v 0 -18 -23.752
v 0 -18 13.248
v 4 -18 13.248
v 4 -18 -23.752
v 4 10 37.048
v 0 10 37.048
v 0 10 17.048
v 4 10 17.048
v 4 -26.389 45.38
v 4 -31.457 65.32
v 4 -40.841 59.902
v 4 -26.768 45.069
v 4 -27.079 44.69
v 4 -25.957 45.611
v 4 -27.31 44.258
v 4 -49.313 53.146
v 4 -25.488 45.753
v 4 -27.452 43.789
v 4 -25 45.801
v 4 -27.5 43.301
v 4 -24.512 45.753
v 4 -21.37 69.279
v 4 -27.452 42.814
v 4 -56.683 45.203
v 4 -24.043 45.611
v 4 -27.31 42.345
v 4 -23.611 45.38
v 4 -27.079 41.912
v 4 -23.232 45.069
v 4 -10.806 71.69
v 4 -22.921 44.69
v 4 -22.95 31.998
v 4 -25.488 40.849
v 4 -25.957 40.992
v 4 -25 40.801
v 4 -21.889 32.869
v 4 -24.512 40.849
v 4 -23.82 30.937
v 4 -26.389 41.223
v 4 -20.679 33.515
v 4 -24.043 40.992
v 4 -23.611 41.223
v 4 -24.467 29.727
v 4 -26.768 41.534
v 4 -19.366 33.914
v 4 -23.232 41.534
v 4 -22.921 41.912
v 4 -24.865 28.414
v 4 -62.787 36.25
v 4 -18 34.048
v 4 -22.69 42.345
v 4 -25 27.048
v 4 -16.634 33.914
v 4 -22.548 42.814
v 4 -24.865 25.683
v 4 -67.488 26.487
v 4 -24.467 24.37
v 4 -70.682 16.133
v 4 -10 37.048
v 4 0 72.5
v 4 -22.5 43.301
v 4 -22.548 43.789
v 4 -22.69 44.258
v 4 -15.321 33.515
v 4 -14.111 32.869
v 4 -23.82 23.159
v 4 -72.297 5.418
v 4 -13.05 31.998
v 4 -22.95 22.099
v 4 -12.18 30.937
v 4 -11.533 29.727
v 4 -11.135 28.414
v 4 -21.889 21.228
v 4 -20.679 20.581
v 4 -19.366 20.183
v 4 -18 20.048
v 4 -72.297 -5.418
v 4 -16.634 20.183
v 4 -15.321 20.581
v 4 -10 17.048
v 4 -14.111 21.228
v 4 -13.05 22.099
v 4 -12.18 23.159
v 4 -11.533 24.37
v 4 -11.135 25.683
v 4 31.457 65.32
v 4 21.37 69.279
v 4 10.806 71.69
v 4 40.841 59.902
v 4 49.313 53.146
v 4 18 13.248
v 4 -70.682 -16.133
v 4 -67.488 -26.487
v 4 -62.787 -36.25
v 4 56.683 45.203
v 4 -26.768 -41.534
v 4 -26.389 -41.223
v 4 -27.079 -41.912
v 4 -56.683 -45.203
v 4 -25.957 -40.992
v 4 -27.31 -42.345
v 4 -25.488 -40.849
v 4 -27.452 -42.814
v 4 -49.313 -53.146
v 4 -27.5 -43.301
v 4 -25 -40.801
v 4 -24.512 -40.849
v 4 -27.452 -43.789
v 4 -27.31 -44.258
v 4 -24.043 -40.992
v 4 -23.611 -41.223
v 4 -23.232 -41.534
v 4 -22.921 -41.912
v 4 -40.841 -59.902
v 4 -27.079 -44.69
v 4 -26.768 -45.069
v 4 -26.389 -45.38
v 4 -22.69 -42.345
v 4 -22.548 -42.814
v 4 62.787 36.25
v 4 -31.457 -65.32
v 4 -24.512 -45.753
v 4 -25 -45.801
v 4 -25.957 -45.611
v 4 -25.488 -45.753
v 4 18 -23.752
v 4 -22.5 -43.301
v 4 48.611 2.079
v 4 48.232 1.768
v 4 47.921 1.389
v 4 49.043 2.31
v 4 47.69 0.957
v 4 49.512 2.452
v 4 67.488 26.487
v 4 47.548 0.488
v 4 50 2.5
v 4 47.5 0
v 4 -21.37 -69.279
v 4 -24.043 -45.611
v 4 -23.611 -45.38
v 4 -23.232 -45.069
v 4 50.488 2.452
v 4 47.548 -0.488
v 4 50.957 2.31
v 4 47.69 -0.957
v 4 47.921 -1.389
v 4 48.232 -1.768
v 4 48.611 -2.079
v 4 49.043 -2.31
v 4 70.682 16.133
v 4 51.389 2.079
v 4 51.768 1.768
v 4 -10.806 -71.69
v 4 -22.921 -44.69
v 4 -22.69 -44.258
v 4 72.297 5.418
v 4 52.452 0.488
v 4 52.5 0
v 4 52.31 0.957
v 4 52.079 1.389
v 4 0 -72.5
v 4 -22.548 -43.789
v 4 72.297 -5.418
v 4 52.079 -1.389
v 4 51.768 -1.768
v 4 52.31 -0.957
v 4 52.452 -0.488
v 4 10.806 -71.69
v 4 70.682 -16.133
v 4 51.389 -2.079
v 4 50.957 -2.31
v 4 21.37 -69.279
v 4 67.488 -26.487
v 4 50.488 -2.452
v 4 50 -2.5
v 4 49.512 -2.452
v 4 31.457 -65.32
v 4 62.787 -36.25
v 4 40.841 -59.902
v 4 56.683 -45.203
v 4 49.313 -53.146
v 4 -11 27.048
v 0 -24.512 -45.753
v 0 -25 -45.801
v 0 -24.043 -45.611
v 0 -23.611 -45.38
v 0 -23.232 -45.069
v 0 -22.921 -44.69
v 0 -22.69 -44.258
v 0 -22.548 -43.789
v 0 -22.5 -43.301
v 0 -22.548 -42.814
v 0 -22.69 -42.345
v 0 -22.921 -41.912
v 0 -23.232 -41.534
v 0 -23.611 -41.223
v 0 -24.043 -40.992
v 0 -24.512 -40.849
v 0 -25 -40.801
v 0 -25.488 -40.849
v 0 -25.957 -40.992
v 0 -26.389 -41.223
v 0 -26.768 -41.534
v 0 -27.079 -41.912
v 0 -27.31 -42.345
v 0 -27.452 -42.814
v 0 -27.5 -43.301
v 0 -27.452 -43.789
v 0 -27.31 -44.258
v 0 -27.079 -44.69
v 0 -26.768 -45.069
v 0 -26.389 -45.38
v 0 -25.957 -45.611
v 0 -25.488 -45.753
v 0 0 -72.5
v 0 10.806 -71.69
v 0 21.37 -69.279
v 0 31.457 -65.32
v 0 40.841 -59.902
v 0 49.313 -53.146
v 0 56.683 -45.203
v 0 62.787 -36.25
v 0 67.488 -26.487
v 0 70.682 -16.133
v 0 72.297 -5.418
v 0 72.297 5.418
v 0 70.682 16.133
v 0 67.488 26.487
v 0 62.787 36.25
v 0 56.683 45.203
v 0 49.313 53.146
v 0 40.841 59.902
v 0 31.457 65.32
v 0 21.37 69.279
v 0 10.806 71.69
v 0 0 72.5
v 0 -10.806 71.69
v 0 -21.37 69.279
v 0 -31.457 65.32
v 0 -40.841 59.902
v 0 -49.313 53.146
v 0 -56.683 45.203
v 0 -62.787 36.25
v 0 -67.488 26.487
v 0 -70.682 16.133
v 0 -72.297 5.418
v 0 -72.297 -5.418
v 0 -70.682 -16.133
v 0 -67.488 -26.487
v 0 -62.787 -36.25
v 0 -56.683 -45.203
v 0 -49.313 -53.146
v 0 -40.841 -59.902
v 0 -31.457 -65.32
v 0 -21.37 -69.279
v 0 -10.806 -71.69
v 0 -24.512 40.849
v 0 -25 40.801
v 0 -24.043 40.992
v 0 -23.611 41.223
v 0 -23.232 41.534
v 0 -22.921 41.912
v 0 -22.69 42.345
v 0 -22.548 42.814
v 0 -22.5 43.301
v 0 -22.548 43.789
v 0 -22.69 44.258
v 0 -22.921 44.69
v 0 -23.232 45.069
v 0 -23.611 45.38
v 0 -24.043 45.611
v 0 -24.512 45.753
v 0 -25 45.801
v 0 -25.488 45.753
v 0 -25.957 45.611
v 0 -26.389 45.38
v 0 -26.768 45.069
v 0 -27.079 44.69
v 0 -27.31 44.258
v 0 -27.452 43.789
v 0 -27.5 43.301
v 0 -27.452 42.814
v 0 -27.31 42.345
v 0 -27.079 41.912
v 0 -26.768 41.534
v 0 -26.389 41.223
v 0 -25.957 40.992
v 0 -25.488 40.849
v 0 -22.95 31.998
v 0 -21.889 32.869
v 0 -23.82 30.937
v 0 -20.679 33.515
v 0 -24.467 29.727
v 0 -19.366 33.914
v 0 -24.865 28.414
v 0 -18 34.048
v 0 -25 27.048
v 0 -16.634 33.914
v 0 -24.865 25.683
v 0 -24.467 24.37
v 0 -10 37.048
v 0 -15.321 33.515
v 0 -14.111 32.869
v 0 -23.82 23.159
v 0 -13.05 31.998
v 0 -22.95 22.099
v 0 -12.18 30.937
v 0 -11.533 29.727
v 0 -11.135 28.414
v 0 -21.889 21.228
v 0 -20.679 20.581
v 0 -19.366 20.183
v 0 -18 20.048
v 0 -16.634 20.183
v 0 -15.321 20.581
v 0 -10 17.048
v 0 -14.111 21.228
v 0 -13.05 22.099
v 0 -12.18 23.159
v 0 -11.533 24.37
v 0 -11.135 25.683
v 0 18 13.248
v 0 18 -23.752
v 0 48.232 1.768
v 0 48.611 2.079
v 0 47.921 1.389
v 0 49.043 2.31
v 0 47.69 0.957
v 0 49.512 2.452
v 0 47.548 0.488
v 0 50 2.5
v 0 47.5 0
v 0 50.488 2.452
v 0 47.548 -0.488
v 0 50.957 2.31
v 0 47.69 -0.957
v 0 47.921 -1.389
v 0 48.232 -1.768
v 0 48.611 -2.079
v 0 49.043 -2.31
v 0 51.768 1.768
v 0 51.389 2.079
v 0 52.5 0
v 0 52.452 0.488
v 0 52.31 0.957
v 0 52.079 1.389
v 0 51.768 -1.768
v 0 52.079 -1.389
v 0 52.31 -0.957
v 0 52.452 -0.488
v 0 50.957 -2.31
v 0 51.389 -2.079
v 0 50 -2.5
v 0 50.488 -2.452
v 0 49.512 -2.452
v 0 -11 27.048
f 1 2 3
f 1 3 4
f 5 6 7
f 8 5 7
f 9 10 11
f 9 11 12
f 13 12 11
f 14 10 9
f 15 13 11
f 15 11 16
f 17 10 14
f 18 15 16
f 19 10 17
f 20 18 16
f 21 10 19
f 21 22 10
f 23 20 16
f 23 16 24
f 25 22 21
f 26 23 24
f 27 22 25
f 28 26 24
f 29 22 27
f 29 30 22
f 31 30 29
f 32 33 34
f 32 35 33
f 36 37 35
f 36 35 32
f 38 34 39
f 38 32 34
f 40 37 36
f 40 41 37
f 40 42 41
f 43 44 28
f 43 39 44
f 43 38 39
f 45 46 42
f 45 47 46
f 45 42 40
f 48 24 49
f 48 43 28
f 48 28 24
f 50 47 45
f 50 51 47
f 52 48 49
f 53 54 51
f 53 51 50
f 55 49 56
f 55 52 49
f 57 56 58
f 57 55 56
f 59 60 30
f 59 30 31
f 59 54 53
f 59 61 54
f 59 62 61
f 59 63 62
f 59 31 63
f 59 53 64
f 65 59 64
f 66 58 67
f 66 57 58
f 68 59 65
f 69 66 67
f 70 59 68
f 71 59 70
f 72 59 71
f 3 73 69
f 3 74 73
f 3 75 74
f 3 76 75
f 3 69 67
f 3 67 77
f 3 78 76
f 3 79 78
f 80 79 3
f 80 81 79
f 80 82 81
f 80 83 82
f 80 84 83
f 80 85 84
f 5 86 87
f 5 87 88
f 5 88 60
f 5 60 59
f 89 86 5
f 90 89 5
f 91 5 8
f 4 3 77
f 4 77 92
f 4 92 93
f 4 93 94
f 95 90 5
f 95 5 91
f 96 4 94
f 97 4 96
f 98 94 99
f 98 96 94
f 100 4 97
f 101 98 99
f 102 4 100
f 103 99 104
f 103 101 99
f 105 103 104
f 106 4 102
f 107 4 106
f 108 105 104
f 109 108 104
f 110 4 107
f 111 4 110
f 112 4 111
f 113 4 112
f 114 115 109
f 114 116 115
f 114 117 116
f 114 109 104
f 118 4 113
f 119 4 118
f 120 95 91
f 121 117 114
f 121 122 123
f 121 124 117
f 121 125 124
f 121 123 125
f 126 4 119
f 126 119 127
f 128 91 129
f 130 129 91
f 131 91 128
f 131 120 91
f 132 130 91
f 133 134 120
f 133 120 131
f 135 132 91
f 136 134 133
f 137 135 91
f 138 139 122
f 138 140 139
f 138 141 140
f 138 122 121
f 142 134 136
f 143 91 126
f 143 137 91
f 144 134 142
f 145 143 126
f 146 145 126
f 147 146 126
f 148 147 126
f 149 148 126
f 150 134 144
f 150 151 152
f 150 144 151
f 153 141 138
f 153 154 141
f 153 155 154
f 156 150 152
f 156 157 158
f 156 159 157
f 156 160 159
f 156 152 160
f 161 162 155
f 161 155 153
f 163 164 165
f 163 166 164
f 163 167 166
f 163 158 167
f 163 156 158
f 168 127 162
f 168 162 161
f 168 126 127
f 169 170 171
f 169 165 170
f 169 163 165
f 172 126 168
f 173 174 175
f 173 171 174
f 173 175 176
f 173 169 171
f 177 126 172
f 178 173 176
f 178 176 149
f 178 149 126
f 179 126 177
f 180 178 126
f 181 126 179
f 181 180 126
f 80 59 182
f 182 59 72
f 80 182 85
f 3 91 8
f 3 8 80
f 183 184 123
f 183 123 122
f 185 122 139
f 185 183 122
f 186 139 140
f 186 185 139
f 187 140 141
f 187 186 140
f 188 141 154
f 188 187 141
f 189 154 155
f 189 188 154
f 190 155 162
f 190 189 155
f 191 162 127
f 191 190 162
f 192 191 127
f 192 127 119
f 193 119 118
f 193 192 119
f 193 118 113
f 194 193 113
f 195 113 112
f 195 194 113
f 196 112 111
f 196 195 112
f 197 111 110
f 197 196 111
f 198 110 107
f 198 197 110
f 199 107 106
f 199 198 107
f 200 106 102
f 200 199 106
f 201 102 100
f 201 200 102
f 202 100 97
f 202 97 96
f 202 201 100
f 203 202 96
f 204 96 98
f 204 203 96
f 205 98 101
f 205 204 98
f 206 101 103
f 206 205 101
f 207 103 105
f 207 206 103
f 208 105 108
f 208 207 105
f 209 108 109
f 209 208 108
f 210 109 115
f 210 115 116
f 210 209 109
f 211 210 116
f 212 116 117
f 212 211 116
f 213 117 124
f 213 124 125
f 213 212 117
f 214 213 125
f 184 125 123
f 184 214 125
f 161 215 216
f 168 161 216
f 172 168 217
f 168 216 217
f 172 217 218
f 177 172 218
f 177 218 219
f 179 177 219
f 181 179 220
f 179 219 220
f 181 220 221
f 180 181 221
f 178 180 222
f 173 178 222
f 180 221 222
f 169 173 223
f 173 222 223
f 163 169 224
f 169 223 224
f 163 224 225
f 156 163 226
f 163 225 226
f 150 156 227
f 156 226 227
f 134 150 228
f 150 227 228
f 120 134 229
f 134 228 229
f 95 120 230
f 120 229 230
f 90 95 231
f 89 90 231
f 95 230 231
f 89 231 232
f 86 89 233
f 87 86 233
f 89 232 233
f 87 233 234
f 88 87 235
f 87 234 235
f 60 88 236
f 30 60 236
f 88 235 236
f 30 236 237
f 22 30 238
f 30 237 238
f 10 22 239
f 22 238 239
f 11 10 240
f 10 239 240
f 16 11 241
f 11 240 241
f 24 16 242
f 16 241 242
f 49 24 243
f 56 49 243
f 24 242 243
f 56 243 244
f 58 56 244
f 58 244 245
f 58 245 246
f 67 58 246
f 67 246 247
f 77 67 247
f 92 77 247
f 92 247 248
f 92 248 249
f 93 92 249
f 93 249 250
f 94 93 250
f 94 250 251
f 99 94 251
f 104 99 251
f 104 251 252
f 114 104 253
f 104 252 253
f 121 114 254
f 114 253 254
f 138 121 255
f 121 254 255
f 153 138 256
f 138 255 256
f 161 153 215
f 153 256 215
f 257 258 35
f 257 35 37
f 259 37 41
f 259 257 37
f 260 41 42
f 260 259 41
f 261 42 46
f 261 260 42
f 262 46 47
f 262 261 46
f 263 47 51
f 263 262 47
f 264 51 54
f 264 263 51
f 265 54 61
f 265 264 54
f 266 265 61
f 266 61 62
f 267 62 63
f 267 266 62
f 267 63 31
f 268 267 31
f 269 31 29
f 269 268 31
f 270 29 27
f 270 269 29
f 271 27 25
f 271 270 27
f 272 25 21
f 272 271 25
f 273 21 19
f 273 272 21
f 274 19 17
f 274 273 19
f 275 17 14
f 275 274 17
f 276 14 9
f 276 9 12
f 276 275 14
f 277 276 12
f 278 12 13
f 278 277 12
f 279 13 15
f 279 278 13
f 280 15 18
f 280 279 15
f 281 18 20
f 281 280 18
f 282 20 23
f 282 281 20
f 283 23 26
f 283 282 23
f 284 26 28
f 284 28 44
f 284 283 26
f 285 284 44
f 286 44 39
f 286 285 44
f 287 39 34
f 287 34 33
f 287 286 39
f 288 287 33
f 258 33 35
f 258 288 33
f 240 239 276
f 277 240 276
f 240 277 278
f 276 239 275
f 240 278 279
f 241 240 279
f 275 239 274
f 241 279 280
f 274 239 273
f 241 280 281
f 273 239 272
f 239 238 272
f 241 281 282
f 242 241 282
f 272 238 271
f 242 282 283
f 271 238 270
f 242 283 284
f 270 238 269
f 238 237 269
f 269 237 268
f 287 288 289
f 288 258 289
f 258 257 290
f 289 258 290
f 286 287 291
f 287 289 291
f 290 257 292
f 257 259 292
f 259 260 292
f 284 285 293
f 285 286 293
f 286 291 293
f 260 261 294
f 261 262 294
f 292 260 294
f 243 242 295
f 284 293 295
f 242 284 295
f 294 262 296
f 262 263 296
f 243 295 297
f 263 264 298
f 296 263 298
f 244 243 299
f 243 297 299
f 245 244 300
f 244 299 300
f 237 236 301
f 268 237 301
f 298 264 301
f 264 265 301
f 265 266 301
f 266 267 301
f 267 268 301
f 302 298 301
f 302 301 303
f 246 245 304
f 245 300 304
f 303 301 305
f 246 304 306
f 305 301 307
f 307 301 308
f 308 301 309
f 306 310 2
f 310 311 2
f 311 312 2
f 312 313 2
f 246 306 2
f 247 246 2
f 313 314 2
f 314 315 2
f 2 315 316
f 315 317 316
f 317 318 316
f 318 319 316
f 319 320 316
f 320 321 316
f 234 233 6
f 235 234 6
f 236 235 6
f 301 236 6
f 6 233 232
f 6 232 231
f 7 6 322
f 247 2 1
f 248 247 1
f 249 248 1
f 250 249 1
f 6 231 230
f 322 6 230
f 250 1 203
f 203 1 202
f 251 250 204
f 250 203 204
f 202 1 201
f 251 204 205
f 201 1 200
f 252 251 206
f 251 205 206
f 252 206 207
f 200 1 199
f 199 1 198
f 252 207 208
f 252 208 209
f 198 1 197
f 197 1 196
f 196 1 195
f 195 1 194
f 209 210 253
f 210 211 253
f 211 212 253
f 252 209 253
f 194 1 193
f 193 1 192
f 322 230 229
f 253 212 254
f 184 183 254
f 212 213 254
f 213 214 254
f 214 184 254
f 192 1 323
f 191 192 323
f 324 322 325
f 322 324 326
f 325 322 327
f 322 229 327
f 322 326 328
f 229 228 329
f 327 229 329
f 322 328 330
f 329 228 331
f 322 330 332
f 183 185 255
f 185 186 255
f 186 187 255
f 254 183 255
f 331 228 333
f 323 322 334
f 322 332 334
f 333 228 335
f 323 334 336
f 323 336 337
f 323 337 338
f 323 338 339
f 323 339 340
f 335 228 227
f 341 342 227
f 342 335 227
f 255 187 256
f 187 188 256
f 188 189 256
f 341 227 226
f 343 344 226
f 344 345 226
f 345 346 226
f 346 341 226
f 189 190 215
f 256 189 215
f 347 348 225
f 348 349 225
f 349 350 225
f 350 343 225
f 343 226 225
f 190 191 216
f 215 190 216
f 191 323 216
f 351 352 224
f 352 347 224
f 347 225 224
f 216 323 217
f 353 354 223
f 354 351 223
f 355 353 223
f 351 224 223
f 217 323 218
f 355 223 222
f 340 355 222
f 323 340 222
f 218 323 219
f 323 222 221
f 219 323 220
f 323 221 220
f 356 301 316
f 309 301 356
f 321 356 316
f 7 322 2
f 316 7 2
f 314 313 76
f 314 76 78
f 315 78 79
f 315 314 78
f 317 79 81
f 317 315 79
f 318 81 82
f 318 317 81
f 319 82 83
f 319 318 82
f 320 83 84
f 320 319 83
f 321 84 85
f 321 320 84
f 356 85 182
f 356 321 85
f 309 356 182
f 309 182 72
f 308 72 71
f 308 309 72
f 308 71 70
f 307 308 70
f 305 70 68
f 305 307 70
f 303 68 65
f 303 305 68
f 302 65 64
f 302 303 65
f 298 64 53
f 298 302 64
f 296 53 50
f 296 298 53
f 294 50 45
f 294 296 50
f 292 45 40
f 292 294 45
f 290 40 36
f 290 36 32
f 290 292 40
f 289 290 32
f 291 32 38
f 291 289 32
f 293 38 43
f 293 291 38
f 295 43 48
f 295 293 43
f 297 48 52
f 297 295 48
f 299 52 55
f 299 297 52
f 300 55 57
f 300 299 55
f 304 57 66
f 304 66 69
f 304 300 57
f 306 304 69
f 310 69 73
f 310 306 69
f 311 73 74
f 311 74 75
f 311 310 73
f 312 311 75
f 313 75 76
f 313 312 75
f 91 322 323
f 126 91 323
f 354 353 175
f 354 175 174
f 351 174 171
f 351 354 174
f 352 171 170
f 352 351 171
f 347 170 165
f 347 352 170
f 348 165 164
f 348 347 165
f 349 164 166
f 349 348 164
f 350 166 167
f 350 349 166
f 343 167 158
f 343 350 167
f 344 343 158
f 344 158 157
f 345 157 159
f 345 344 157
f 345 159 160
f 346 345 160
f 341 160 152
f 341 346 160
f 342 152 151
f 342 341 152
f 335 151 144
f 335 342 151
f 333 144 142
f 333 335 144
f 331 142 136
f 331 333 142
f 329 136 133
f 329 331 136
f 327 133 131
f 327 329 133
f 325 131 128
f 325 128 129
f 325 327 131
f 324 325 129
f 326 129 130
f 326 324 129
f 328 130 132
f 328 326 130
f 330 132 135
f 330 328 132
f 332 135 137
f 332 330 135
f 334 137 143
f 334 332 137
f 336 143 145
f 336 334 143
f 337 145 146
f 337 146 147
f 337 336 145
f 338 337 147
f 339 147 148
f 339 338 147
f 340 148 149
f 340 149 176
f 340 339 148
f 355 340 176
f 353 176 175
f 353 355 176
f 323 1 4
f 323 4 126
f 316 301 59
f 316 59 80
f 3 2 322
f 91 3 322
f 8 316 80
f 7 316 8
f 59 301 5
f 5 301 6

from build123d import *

# Parameters (mm, degrees)
SKETCH1_R           = 72.5
SKETCH1_R_2         = 7
SKETCH1_R_3         = 2.5
SKETCH1_W           = 37
SKETCH1_H           = 36
SKETCH1_W_2         = 20
SKETCH1_H_2         = 20
BOSS_EXTRUDE1_DEPTH = 4


with BuildPart() as part:
    # Sketch1 → Boss-Extrude1 (new body)
    with BuildSketch(Plane(origin=(0, 0, 0), x_dir=(0, 0, -1), z_dir=(1, 0, 0))):
        Circle(SKETCH1_R)
        with Locations((-27.048330148, -18)):
            Circle(SKETCH1_R_2, mode=Mode.SUBTRACT)
        with Locations((0, 50)):
            Circle(SKETCH1_R_3, mode=Mode.SUBTRACT)
        with Locations((43.301270189, -25)):
            Circle(SKETCH1_R_3, mode=Mode.SUBTRACT)
        with Locations((-43.301270189, -25)):
            Circle(SKETCH1_R_3, mode=Mode.SUBTRACT)
        with Locations((5.251669852, 0)):
            Rectangle(SKETCH1_W, SKETCH1_H, mode=Mode.SUBTRACT)
        with Locations((-27.048330148, 0)):
            Rectangle(SKETCH1_W_2, SKETCH1_H_2, mode=Mode.SUBTRACT)
    extrude(amount=BOSS_EXTRUDE1_DEPTH)


solid = part.part
